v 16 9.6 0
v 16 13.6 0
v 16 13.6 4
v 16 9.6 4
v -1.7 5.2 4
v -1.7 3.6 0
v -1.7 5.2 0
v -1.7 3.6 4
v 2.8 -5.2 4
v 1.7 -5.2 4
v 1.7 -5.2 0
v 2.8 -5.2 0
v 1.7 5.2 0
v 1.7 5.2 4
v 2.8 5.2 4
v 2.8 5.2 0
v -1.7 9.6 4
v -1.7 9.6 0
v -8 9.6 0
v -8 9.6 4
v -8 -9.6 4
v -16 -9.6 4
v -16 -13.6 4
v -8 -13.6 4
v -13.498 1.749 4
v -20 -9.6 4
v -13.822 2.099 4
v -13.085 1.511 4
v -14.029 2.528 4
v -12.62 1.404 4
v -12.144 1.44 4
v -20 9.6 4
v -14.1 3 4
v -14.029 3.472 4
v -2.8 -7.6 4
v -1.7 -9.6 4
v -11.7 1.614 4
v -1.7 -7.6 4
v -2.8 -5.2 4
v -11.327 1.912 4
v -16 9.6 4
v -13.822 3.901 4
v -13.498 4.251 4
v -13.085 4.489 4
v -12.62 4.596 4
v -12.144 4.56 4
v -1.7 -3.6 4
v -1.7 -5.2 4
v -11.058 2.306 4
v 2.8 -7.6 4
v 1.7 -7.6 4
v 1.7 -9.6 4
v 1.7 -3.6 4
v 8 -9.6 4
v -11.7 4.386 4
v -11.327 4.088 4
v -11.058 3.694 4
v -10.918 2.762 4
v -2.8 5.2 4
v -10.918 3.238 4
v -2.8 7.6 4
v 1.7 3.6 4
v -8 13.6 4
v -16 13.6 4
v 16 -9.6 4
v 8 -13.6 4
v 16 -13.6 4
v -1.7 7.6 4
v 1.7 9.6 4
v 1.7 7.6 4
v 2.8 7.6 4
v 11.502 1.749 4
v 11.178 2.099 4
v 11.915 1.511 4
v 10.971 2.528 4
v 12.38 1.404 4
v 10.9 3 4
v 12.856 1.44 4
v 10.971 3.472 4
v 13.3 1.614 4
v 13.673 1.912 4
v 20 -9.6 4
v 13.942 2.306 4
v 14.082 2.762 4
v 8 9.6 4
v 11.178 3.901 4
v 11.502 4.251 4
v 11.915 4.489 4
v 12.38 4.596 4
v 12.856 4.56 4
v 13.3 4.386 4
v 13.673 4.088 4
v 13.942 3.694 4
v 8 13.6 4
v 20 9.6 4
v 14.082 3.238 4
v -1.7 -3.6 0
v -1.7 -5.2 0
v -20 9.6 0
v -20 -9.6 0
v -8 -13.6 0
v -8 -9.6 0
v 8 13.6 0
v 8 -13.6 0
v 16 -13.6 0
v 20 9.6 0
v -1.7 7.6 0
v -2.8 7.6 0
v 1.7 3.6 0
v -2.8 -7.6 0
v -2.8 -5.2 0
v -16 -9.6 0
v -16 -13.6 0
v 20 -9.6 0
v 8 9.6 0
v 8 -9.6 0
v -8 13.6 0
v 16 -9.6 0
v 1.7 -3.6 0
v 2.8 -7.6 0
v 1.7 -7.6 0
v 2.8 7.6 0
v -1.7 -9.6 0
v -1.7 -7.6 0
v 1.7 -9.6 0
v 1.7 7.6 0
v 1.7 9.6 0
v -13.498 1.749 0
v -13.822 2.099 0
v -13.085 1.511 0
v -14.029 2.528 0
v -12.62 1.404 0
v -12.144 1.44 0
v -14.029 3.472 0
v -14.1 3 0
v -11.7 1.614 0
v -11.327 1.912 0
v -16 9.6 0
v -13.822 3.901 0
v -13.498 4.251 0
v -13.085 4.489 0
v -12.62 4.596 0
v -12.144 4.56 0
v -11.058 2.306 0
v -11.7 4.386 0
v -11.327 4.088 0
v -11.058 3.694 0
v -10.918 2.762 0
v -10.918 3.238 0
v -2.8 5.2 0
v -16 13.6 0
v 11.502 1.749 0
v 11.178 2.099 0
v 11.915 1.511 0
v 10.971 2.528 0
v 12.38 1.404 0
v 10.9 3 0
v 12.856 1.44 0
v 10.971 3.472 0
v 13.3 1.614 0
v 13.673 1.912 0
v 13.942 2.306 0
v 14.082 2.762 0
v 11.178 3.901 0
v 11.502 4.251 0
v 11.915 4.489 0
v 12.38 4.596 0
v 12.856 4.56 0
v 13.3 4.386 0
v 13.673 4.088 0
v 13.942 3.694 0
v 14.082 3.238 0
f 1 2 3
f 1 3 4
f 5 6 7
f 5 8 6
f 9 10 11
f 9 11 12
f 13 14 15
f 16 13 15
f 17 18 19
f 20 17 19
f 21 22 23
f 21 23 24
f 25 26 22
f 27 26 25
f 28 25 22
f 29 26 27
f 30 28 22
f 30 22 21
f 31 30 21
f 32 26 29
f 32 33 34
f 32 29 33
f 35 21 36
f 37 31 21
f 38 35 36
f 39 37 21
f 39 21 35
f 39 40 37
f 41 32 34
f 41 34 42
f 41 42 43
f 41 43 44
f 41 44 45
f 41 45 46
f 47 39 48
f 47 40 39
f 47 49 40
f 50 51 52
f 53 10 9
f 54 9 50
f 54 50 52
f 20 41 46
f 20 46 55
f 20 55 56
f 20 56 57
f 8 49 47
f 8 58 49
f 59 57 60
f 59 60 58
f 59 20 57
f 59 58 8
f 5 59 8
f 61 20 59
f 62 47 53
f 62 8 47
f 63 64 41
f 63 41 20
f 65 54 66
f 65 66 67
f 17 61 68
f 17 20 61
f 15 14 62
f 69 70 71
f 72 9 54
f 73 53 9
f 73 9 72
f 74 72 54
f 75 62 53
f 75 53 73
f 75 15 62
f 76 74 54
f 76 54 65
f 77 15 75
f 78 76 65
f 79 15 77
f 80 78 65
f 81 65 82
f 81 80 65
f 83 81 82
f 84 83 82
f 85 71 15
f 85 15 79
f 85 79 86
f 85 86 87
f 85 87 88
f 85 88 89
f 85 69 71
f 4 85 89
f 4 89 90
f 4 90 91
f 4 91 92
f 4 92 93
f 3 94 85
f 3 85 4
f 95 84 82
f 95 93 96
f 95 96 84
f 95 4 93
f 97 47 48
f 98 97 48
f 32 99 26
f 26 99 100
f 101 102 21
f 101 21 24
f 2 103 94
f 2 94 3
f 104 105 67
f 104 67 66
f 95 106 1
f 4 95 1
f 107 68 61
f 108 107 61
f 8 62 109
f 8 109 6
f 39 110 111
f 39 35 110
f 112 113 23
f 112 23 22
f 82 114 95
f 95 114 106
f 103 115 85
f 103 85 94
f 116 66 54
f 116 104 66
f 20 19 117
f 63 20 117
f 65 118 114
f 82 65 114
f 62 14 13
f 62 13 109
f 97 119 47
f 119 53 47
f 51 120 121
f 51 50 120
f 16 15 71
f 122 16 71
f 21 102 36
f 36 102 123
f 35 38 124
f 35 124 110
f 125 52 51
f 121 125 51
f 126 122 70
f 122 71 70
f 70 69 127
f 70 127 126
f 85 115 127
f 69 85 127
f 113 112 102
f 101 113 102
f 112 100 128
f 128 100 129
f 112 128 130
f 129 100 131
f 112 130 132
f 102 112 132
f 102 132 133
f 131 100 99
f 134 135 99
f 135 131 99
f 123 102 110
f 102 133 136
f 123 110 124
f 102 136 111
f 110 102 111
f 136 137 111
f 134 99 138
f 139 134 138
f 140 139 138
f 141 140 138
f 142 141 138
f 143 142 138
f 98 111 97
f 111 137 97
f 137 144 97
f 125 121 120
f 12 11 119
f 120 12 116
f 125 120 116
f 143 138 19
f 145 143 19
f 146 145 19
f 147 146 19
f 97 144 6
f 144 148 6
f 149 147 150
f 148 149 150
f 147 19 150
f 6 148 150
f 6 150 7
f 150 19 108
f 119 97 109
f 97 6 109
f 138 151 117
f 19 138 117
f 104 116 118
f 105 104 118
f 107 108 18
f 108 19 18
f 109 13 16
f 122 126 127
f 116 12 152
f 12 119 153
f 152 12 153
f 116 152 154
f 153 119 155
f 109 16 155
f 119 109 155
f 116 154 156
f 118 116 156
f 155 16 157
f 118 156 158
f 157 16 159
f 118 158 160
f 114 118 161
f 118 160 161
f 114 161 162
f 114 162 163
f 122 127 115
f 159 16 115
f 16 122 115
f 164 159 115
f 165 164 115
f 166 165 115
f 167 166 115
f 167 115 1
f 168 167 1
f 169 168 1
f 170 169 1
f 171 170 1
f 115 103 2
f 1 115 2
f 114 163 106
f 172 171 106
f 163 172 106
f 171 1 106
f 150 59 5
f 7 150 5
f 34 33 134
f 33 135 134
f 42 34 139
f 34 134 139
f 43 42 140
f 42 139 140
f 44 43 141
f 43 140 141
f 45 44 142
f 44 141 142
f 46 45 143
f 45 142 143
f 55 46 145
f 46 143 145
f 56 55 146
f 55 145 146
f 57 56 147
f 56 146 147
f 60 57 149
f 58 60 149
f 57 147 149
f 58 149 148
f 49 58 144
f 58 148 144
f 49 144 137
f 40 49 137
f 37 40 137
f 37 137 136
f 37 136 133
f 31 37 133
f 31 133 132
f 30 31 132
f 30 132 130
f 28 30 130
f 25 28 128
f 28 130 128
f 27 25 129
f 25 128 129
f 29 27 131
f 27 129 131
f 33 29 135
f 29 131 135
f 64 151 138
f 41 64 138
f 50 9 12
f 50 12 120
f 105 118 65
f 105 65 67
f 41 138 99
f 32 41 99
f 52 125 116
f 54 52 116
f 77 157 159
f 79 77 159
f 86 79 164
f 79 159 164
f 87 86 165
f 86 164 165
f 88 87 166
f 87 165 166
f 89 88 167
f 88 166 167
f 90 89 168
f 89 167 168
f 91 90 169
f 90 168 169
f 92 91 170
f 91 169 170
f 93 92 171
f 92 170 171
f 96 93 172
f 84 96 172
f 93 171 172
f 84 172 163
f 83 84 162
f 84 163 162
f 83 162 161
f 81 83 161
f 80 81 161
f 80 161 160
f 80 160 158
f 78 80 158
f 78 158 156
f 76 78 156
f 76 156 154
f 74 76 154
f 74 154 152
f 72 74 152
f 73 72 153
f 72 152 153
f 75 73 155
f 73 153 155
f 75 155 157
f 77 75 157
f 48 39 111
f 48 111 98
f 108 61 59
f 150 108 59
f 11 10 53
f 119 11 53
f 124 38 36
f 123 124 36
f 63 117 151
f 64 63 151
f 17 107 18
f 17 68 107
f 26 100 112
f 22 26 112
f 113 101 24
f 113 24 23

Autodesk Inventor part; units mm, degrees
ref_plane "YZ Plane" through (0, 0, 0) normal (1, 0, 0) x (0, 1, 0)
ref_plane "XZ Plane" through (0, 0, 0) normal (0, 1, 0) x (-1, 0, 0)
ref_plane "XY Plane" through (0, 0, 0) normal (0, 0, 1) x (1, 0, 0)
sketch "Эскиз1" plane through (0, 0, 0) normal (0, 0, 1) x (1, 0, 0)
  line L0 (20, 9.6) -> (-20, 9.6)
  line L1 (-20, 9.6) -> (-20, -9.6)
  line L2 (-20, -9.6) -> (20, -9.6)
  line L3 (20, -9.6) -> (20, 9.6)
  line L4 (20, 9.6) -> (-20, -9.6) construction
  line L5 (-20, 9.6) -> (20, -9.6) construction
  line L6 (-16, 9.6) -> (-8, 9.6)
  line L7 (-8, 9.6) -> (-8, 13.6)
  line L8 (-8, 13.6) -> (-16, 13.6)
  line L9 (-16, 13.6) -> (-16, 9.6)
  line L10 (16, 9.6) -> (8, 9.6)
  line L11 (8, 9.6) -> (8, 13.6)
  line L12 (8, 13.6) -> (16, 13.6)
  line L13 (16, 13.6) -> (16, 9.6)
  line L14 (-16, -9.6) -> (-8, -9.6)
  line L15 (-8, -9.6) -> (-8, -13.6)
  line L16 (-8, -13.6) -> (-16, -13.6)
  line L17 (-16, -13.6) -> (-16, -9.6)
  line L18 (8, -9.6) -> (16, -9.6)
  line L19 (16, -9.6) -> (16, -13.6)
  line L20 (16, -13.6) -> (8, -13.6)
  line L21 (8, -13.6) -> (8, -9.6)
  point P0 (0, 0)
  point P1 (-16, 11.6)
  point P2 (16, -9.6)
  point P3 (8, 9.6)
  point P4 (-8, 9.6)
  dimension "d0" = 40
  dimension "d1" = 19.2
  dimension "d2" = 8
  dimension "d3" = 4
  dimension "d4" = 8
  dimension "d5" = 4
  dimension "d6" = 4
  dimension "d7" = 4
  dimension "d8" = 8
  dimension "d9" = 4
extrude "Выдавливание1" add sketch "Эскиз1" along normal blind 4
sketch "Эскиз2" plane through (0, 0, 4) normal (0, 0, 1) x (1, 0, 0)
  line L0 (8, 9.6) -> (-8, 9.6) projected
  line L1 (-1.7, 9.6) -> (1.7, 9.6)
  line L2 (1.7, 9.6) -> (1.7, 3.6)
  line L3 (1.7, 3.6) -> (-1.7, 3.6)
  line L4 (-1.7, 3.6) -> (-1.7, 9.6)
  line L5 (0, 9.6) -> (0, 3.6) construction
  line L6 (-2.8, 5.2) -> (2.8, 5.2)
  line L7 (2.8, 5.2) -> (2.8, 7.6)
  line L8 (2.8, 7.6) -> (-2.8, 7.6)
  line L9 (-2.8, 7.6) -> (-2.8, 5.2)
  line L10 (-2.8, 5.2) -> (2.8, 7.6) construction
  line L11 (2.8, 5.2) -> (-2.8, 7.6) construction
  line L12 (-20, 9.6) -> (-20, -9.6) projected
  line L13 (-20, 0) -> (20, 0) construction
  line L14 (20, -9.6) -> (20, 9.6) projected
  line L15 (8, -9.6) -> (-8, -9.6)
  line L16 (-1.7, -9.6) -> (1.7, -9.6)
  line L17 (1.7, -9.6) -> (1.7, -3.6)
  line L18 (1.7, -3.6) -> (-1.7, -3.6)
  line L19 (-1.7, -3.6) -> (-1.7, -9.6)
  line L20 (0, -9.6) -> (0, -3.6) construction
  line L21 (-2.8, -5.2) -> (2.8, -5.2)
  line L22 (2.8, -5.2) -> (2.8, -7.6)
  line L23 (2.8, -7.6) -> (-2.8, -7.6)
  line L24 (-2.8, -7.6) -> (-2.8, -5.2)
  line L25 (-2.8, -5.2) -> (2.8, -7.6) construction
  line L26 (2.8, -5.2) -> (-2.8, -7.6) construction
  point P0 (0, 0)
  point P1 (0, 6.4)
  point P2 (0, -6.4)
  point P3 (1.7, 5.2)
  point P4 (1.7, 7.6)
  point P5 (1.7, 9.6)
  point P6 (-1.7, 7.6)
  point P7 (-1.7, 5.2)
  point P8 (-1.7, -7.6)
  point P9 (1.7, -7.6)
  point P10 (1.7, -5.2)
  point P11 (-1.7, -5.2)
  dimension "d12" = 3.4
  dimension "d13" = 6
  dimension "d14" = 5.6
  dimension "d15" = 2.4
  dimension "d16" = 2
extrude "Выдавливание2" cut sketch "Эскиз2" against normal blind 10
sketch "Эскиз3" plane through (0, 0, 0) normal (0, 0, -1) x (-1, 0, 0)
  circle A0 centre (12.5, 3) radius 1.6 projected
  circle A1 centre (-12.5, 3) radius 1.6 projected
  point P0 (0, 0)
extrude "Выдавливание3" cut sketch "Эскиз3" against normal blind 10
properties part number "стена_каретки"
